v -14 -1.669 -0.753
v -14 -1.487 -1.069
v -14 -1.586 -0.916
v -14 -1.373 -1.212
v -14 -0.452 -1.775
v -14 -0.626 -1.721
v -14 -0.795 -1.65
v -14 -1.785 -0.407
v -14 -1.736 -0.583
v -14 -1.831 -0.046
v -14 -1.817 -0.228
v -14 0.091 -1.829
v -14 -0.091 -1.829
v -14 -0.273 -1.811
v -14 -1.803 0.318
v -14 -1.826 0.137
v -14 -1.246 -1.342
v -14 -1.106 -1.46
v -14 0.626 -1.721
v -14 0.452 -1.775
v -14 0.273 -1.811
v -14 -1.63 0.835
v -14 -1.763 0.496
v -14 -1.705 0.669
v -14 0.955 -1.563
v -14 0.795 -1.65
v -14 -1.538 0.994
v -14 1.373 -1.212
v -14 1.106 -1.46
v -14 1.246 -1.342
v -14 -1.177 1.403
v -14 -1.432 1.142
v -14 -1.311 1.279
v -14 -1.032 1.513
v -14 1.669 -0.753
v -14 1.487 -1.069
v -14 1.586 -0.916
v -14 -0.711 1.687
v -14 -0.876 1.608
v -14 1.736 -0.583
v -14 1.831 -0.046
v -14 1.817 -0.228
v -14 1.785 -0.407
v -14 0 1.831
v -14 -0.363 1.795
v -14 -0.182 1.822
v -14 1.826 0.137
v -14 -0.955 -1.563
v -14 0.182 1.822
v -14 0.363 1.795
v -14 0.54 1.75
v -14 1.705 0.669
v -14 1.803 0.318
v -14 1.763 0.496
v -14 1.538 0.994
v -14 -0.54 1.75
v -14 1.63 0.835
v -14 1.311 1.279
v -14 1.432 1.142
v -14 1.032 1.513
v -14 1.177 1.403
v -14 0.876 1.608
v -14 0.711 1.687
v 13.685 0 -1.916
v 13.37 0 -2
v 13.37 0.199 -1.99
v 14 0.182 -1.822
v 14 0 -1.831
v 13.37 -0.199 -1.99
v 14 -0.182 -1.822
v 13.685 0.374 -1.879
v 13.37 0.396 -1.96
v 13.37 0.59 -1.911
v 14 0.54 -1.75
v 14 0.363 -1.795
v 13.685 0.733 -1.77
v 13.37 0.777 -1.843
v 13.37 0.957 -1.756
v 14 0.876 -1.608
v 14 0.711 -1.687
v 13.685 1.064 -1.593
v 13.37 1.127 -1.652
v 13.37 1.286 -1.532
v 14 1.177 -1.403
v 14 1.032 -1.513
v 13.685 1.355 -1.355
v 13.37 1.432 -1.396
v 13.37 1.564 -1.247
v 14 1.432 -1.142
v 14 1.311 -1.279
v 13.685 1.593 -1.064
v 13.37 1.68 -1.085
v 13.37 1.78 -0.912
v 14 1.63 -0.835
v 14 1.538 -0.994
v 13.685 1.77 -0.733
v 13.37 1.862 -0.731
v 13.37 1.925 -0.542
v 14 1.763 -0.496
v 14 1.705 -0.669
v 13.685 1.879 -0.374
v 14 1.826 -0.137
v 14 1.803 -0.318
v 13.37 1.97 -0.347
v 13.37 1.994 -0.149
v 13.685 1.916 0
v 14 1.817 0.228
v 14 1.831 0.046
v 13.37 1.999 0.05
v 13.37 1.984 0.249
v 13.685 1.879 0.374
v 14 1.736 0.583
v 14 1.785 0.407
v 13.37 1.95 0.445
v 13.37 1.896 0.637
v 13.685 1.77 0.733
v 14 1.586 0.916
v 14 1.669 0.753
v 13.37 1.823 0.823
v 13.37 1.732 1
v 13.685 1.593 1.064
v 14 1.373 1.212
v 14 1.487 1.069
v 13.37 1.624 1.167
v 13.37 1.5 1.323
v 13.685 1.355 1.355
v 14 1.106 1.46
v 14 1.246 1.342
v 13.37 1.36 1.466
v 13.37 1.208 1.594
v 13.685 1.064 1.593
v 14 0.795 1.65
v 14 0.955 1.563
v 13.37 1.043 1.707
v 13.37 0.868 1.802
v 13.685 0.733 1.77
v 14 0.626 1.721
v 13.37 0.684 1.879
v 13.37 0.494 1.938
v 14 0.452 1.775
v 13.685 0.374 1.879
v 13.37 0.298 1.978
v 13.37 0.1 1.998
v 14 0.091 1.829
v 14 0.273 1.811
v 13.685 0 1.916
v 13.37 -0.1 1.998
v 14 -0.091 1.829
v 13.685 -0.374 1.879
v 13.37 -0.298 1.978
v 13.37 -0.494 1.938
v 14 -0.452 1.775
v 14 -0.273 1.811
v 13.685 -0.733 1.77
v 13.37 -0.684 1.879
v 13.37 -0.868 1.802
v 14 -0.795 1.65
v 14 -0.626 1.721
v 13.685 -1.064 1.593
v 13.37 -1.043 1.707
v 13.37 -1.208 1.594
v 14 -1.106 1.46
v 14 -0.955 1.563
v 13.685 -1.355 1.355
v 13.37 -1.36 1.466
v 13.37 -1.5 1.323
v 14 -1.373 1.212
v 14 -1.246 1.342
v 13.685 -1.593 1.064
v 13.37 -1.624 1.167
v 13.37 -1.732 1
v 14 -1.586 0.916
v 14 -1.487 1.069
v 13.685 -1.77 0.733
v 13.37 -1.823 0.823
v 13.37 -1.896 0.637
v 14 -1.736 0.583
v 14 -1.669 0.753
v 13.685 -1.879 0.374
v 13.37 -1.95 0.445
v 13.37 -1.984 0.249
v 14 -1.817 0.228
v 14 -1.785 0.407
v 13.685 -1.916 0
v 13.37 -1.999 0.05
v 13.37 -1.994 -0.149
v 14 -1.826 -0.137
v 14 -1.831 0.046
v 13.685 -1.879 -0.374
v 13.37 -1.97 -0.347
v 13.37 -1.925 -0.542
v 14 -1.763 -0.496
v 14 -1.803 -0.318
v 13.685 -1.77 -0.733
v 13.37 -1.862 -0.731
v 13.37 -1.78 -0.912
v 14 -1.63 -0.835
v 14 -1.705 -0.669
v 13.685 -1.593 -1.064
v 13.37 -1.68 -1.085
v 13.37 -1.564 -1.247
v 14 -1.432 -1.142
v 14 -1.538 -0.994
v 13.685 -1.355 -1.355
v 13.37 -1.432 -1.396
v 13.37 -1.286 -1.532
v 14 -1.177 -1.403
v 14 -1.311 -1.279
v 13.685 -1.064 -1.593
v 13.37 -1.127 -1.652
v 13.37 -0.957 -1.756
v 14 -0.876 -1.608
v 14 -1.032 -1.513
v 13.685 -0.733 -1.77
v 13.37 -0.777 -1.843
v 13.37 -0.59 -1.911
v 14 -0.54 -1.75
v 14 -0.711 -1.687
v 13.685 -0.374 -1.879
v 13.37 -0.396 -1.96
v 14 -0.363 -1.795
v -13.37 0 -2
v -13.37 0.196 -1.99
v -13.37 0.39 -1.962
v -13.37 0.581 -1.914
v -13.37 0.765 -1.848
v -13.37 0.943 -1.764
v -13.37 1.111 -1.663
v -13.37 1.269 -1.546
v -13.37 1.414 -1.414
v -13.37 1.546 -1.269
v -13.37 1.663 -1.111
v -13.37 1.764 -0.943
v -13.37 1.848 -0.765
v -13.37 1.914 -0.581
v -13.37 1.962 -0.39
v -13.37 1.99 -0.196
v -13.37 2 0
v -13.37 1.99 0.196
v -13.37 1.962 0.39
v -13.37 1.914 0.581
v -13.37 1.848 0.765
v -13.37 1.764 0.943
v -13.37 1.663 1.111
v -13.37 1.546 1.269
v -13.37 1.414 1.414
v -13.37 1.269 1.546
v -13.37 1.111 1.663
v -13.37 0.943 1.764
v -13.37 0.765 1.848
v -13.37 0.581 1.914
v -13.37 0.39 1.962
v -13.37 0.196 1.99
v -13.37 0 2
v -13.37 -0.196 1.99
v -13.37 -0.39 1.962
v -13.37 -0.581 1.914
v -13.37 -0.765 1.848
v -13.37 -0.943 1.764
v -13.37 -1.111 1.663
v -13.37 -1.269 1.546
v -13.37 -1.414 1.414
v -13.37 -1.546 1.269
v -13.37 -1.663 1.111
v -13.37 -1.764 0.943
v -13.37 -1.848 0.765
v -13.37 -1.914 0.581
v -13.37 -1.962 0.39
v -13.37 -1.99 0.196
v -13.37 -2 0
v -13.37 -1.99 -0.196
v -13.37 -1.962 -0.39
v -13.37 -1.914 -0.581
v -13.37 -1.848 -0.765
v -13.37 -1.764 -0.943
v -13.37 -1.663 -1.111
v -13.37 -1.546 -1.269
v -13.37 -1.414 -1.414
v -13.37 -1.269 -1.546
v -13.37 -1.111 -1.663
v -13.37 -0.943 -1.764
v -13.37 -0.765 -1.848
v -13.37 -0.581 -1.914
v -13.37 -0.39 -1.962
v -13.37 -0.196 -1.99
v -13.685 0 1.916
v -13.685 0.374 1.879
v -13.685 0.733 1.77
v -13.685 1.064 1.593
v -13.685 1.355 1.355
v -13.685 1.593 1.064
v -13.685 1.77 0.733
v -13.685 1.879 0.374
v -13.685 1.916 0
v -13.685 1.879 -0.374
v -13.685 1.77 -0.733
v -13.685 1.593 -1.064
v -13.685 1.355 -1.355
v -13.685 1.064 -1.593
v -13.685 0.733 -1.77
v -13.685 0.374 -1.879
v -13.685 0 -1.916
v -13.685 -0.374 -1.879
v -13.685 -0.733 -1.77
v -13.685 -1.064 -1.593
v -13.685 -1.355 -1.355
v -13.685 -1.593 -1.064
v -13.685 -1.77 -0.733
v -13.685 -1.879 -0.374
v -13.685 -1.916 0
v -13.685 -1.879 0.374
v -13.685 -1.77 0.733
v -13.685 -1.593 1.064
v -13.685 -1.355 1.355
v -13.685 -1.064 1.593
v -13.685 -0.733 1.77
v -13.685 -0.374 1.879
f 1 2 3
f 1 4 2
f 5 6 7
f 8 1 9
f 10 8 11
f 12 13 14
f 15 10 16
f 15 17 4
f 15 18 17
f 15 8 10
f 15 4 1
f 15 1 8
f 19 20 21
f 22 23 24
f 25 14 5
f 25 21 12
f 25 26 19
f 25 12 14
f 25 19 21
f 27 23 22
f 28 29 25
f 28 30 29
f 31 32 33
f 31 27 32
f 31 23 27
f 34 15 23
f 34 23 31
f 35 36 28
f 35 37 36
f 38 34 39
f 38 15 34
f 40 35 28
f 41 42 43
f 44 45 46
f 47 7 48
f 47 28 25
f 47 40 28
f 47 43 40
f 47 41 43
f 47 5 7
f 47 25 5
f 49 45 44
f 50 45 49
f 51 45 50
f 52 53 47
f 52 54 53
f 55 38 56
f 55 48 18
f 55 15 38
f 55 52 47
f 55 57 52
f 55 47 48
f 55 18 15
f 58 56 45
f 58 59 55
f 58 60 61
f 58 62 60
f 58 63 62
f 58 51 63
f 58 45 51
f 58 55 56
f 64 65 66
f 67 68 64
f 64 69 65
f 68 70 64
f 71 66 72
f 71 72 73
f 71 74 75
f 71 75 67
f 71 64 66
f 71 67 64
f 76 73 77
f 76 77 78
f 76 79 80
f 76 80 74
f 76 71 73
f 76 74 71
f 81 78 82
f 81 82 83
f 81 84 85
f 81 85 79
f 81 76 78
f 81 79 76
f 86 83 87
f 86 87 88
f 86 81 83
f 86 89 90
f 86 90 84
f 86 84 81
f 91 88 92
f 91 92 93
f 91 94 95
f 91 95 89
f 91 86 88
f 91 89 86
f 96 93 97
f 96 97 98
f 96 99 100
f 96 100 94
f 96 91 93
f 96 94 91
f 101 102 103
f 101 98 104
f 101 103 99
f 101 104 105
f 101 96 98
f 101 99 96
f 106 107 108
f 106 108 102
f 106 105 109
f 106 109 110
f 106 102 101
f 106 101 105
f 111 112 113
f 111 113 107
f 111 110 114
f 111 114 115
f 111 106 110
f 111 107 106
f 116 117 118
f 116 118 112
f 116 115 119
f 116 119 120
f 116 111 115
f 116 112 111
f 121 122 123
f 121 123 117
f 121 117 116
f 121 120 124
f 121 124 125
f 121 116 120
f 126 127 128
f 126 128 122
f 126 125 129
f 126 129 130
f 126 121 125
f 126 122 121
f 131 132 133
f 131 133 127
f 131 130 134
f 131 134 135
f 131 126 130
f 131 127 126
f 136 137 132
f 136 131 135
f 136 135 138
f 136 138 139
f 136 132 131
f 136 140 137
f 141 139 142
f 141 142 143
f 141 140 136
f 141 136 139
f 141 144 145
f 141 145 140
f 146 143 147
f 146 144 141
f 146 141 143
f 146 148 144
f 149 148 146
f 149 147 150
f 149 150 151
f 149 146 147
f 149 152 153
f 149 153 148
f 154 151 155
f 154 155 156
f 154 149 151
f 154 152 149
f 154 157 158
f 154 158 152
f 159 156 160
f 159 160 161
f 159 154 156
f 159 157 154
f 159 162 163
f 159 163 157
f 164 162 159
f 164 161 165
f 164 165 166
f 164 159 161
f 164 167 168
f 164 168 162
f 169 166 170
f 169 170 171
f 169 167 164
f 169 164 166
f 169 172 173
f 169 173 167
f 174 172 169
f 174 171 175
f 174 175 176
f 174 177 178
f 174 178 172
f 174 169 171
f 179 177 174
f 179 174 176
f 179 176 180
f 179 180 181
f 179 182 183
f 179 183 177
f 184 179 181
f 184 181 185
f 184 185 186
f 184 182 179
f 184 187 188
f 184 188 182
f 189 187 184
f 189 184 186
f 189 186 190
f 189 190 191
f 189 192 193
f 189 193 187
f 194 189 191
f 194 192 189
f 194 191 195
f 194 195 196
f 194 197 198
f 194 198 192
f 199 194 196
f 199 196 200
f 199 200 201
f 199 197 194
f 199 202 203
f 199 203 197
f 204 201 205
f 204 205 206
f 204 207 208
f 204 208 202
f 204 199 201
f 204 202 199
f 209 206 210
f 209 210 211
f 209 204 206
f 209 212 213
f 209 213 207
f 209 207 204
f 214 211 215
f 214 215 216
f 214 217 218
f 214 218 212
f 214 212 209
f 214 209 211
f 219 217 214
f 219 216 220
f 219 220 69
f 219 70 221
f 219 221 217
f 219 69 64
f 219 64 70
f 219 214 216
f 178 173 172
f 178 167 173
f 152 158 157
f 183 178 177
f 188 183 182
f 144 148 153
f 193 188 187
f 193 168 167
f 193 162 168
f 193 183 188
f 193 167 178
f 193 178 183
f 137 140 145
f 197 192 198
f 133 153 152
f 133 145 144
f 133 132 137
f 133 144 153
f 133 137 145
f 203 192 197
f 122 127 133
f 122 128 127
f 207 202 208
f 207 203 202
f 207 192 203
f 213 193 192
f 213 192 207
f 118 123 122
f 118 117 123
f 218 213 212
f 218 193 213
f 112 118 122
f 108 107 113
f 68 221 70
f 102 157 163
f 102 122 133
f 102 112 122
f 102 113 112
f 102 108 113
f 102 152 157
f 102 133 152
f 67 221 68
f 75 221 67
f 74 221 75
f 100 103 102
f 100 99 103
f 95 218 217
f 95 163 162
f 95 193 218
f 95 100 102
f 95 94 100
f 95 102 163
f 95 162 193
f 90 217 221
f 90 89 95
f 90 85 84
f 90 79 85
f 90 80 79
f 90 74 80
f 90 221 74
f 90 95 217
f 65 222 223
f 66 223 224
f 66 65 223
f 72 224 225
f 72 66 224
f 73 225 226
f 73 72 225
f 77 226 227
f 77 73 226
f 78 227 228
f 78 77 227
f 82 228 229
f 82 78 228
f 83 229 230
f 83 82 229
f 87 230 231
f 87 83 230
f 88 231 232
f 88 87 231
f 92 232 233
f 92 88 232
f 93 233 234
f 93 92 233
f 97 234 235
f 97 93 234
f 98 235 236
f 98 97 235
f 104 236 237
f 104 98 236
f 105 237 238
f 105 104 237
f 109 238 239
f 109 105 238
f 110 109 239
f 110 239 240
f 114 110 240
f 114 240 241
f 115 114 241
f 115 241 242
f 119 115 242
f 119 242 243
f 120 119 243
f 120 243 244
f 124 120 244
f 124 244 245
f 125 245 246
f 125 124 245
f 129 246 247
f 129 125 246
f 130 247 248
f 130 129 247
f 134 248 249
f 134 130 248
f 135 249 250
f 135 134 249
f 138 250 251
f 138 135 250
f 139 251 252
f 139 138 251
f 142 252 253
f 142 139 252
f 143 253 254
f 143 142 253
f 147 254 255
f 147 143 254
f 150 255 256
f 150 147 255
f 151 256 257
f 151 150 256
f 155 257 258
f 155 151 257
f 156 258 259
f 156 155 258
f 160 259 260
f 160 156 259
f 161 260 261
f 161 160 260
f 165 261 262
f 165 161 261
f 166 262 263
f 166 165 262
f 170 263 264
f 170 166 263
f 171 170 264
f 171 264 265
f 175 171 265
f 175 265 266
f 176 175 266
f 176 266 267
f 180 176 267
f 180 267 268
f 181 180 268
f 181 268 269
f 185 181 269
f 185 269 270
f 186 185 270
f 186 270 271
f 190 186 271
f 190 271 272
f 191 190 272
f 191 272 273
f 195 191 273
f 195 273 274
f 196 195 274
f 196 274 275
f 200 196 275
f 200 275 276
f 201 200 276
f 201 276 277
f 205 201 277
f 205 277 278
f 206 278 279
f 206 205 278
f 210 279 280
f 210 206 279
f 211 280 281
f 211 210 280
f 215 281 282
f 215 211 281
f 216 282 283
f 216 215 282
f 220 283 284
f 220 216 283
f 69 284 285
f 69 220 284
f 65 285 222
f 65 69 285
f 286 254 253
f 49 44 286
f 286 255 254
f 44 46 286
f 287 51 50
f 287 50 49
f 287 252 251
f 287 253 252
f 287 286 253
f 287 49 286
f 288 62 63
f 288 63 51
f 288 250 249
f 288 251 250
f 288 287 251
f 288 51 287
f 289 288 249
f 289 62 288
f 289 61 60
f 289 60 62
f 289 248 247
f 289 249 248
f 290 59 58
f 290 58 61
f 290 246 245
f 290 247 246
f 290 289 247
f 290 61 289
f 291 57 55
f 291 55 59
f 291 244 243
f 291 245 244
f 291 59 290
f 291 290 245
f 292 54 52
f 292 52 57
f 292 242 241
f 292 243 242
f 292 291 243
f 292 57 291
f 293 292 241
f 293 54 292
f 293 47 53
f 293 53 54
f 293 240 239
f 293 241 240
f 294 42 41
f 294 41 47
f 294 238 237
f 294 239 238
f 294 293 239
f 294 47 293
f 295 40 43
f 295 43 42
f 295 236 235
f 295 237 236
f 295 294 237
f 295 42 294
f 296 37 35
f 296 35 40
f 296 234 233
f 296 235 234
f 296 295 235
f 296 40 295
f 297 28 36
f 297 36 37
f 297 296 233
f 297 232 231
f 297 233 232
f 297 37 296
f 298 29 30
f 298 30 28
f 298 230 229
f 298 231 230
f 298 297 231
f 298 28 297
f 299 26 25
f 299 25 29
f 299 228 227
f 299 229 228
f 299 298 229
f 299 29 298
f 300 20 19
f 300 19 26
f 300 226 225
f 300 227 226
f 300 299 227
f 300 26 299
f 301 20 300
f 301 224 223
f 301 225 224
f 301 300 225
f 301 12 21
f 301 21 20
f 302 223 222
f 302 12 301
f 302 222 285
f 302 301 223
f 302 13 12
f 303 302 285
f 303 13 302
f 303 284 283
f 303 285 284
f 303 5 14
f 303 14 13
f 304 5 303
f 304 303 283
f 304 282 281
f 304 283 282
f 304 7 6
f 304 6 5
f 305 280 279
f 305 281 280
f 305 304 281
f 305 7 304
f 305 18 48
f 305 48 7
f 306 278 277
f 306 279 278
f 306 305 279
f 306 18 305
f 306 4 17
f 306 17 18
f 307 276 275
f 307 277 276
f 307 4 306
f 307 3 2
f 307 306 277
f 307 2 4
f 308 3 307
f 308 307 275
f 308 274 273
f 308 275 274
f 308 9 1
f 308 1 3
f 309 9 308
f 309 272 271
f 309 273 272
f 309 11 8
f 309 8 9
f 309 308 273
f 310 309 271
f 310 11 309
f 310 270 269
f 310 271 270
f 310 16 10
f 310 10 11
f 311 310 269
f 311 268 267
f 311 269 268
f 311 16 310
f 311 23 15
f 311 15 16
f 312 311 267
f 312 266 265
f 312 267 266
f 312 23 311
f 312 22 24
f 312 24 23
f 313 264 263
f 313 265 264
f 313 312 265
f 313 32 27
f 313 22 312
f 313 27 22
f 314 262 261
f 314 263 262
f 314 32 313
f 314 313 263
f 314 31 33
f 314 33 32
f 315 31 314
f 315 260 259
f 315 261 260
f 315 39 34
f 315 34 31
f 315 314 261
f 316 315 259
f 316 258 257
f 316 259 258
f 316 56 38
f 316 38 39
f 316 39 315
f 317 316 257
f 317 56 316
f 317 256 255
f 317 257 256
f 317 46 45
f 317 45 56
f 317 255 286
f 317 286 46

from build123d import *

# Parameters (mm, degrees)
SKETCH2_R           = 2
EXTRUDE1_DEPTH      = 13.37
EXTRUDE1_DEPTH_BACK = 13.37
SKETCH3_R           = 2
EXTRUDE2_DEPTH      = 0.63
EXTRUDE2_TAPER      = 15
SKETCH4_R           = 2
EXTRUDE3_DEPTH      = 0.63
EXTRUDE3_TAPER      = 15


with BuildPart() as part:
    # Sketch2 → Extrude1 (new body, two sides)
    with BuildSketch(Plane(origin=(0, 0, 0), x_dir=(0, 0, -1), z_dir=(1, 0, 0))) as extrude1_sk:
        Circle(SKETCH2_R)
    extrude(amount=EXTRUDE1_DEPTH)
    extrude(extrude1_sk.sketch, amount=-EXTRUDE1_DEPTH_BACK)

    # Sketch3 → Extrude2 (add)
    with BuildSketch(Plane(origin=(13.37, 0, 0), x_dir=(0, 0, -1), z_dir=(1, 0, 0))):
        Circle(SKETCH3_R)
    extrude(amount=EXTRUDE2_DEPTH, taper=EXTRUDE2_TAPER)

    # Sketch4 → Extrude3 (add)
    with BuildSketch(Plane.ZY.offset(13.37)):
        Circle(SKETCH4_R)
    extrude(amount=EXTRUDE3_DEPTH, taper=EXTRUDE3_TAPER)


solid = part.part
